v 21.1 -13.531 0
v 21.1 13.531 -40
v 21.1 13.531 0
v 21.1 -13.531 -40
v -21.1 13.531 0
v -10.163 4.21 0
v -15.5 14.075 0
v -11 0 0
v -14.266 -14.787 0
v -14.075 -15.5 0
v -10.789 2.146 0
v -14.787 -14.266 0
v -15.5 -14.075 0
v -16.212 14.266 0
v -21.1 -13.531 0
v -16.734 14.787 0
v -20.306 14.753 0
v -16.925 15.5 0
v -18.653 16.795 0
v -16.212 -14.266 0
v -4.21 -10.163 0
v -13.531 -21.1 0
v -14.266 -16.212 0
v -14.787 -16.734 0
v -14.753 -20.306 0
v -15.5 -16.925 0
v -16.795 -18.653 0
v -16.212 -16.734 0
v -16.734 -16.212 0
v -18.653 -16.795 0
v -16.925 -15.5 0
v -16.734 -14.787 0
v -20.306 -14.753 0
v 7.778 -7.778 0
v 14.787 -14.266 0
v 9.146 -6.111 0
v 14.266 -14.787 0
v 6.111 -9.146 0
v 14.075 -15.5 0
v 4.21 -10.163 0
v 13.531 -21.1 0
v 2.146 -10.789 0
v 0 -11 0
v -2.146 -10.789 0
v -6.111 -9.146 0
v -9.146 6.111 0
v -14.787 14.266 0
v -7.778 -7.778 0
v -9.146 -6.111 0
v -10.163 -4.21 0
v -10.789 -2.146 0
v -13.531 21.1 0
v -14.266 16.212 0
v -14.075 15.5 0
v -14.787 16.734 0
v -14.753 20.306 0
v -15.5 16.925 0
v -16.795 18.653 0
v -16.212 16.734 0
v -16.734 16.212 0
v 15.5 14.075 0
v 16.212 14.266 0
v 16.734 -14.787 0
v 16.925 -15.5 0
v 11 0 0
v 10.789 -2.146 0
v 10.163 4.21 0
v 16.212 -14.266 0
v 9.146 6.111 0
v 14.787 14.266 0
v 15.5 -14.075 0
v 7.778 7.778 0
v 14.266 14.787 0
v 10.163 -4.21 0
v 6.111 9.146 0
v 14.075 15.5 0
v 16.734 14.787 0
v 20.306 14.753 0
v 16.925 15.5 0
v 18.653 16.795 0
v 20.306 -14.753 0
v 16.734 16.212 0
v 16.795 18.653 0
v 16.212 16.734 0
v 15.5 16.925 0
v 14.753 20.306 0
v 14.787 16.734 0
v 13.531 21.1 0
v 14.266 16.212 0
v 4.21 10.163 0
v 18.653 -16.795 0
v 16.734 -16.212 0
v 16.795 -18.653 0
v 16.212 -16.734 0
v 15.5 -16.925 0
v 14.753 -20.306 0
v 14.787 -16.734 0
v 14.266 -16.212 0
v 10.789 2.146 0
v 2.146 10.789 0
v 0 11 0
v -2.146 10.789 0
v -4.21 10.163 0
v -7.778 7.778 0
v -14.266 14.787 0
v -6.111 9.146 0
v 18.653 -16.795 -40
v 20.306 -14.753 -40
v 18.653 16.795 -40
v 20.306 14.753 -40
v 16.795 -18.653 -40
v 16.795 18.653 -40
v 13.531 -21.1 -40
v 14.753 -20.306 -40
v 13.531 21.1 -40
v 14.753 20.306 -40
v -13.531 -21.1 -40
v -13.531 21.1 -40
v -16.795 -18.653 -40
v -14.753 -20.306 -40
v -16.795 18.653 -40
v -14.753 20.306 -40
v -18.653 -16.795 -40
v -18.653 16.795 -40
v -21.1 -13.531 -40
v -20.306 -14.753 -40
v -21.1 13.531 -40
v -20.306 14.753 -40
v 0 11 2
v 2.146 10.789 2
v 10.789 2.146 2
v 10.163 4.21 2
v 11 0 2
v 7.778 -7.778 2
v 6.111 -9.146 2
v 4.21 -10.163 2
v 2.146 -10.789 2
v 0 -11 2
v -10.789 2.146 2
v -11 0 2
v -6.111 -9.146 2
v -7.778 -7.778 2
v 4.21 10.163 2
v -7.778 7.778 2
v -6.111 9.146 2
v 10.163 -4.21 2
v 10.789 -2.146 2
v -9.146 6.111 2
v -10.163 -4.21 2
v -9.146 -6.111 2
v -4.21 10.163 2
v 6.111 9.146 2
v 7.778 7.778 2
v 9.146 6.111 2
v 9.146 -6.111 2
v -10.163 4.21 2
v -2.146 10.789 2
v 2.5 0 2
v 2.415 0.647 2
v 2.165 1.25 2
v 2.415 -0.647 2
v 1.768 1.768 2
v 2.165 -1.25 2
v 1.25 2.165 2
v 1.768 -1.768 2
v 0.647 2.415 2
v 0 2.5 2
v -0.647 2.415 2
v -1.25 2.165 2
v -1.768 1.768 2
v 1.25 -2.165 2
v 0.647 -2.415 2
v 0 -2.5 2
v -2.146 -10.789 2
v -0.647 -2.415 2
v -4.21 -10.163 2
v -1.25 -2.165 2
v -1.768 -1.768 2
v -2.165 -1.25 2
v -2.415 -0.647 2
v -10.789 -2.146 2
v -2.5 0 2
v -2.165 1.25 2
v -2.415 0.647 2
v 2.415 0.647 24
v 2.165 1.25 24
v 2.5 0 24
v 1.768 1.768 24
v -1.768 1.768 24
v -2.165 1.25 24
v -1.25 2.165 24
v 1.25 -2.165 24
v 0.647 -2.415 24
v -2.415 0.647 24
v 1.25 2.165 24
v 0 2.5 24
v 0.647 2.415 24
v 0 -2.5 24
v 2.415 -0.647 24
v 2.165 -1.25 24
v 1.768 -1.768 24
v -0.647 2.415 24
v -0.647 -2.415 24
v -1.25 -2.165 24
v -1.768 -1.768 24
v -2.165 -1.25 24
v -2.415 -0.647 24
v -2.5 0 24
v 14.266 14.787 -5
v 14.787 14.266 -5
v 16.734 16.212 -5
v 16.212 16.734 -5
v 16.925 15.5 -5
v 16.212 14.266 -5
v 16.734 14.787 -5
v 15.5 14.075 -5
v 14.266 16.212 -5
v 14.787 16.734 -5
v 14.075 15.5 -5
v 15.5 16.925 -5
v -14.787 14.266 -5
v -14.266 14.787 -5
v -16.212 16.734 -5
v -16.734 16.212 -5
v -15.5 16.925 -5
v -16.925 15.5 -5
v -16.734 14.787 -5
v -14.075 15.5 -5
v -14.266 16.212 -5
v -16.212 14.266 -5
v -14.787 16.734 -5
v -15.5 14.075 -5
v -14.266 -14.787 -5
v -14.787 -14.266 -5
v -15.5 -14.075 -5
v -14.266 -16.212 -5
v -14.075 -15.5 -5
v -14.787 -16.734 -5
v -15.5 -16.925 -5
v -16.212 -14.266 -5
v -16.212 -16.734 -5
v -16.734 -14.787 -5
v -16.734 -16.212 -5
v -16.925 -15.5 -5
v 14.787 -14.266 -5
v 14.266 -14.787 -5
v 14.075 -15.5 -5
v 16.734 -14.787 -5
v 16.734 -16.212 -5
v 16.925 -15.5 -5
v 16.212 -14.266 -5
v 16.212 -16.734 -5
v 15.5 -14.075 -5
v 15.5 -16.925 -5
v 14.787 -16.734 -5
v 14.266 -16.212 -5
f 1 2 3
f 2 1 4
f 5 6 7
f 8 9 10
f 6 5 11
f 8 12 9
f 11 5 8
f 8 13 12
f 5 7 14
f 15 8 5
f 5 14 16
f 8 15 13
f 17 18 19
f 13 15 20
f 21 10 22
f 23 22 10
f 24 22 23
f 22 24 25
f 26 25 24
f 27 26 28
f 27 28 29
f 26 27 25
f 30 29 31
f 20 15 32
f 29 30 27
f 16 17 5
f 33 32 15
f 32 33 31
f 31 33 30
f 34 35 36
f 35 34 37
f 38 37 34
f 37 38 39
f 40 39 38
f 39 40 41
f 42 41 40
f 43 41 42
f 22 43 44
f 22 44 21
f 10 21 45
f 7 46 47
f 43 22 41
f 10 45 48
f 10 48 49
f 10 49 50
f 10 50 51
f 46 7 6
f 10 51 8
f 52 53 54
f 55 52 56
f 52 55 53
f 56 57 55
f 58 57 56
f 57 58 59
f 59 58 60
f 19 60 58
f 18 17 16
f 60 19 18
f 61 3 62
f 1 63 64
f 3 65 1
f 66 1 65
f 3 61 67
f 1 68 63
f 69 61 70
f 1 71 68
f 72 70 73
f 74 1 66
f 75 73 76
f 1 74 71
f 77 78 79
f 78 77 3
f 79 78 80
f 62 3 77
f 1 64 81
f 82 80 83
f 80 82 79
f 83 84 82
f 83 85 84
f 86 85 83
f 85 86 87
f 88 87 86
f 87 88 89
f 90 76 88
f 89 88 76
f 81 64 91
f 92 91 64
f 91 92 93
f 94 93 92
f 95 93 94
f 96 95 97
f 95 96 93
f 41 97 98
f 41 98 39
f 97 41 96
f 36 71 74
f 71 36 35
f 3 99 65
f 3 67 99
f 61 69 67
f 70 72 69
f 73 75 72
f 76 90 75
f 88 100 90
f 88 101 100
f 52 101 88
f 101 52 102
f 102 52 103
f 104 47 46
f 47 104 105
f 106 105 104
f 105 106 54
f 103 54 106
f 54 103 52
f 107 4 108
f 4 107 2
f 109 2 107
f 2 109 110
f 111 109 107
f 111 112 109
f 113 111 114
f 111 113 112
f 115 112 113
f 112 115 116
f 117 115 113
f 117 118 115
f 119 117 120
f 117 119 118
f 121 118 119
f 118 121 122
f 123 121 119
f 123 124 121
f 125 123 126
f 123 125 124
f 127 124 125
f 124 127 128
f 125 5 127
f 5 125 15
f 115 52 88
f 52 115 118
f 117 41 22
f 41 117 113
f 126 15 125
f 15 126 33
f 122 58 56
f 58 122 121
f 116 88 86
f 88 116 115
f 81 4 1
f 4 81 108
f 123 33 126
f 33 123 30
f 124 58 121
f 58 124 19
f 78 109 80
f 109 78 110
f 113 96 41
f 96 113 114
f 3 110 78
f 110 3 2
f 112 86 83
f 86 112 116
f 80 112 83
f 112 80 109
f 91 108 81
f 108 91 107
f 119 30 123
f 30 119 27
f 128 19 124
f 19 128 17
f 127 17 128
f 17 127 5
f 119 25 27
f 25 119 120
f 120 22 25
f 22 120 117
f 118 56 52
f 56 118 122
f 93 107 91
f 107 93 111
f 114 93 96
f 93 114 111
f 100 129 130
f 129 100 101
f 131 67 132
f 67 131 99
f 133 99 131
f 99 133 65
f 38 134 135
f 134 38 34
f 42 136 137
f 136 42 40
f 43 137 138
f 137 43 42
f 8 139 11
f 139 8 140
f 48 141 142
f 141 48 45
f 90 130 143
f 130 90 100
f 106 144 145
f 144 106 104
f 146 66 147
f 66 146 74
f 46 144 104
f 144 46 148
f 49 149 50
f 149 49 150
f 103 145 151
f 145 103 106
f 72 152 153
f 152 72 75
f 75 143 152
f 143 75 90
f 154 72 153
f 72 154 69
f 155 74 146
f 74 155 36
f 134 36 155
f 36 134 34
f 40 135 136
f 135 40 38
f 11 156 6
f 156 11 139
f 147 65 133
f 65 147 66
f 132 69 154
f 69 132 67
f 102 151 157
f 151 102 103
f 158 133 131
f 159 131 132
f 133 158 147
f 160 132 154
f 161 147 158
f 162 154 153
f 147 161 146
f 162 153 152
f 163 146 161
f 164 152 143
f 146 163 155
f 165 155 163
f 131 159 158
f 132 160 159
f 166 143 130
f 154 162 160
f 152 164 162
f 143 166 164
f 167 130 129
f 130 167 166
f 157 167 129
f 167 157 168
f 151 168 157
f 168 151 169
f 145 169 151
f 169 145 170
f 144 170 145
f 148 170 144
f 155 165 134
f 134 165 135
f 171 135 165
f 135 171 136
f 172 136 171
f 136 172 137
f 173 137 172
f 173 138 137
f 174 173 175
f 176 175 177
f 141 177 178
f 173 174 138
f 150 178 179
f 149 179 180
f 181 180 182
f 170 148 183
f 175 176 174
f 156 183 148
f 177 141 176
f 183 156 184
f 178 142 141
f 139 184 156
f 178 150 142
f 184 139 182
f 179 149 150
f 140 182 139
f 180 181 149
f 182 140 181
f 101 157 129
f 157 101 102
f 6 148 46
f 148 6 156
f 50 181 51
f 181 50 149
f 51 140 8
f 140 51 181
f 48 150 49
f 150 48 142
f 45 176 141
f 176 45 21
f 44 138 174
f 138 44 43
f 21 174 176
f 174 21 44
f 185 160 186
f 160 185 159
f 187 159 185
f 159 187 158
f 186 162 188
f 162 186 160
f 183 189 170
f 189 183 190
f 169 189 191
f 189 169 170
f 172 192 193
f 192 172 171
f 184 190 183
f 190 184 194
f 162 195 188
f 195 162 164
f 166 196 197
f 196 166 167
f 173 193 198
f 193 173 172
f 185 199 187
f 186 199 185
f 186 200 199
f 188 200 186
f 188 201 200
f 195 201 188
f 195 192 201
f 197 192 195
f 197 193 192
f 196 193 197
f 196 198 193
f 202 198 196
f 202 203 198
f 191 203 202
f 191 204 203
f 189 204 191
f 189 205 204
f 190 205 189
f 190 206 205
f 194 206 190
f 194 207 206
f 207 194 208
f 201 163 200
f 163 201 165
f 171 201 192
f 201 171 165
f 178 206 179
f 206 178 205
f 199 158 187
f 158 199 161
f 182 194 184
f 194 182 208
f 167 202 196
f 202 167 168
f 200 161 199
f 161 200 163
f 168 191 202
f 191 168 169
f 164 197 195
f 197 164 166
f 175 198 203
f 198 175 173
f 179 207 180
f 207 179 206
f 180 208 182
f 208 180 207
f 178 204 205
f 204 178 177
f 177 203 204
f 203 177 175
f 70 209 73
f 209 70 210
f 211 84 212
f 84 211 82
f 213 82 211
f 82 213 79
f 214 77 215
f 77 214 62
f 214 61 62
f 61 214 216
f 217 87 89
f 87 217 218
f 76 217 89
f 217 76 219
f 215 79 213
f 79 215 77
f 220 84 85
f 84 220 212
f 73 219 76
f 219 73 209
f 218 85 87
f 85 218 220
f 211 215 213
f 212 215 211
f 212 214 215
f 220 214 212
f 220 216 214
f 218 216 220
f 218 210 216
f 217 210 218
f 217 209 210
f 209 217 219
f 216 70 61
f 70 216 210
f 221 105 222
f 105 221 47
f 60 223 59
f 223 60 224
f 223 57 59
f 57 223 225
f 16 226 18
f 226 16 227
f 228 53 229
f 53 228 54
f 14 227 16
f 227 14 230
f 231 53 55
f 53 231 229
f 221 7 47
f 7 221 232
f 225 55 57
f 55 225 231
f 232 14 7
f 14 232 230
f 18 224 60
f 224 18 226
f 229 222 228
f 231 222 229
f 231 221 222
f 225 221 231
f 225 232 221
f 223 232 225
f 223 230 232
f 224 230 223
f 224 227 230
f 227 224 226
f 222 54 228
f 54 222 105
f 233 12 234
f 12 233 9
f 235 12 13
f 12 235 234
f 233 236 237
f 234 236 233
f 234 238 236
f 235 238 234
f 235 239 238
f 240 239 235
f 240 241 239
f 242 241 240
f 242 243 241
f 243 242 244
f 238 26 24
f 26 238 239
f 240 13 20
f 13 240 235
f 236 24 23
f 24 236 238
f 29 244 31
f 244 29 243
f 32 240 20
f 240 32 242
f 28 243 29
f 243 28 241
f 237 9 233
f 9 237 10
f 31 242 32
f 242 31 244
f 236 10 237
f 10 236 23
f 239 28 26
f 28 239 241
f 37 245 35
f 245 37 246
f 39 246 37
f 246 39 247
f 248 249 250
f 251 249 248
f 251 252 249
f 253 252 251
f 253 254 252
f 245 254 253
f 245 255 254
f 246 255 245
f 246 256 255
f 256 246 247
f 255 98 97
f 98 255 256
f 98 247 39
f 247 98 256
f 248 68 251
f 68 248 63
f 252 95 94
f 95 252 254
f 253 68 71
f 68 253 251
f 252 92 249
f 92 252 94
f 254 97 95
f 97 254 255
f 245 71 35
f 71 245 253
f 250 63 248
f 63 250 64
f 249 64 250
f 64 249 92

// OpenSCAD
m3_major = 2.85;
m3_radius = m3_major/2;

module nema17(motor_length = 40) {
  // NEMA 17 stepper motor.
  difference() {
    union() {
      translate([0, 0, -motor_length/2]) intersection() {
        cube([42.2, 42.2, motor_length], center=true);
        cylinder(r=25.1, h=motor_length+1, center=true, $fn=60);
      }
      cylinder(r=11, h=4, center=true, $fn=32);
      cylinder(r=2.5, h=48, center=true, $fn=24);
    }
    for (a = [0:90:359]) {
      rotate([0, 0, a]) translate([15.5, 15.5, 0])
        cylinder(r=m3_radius, h=10, center=true, $fn=12);
    }
  }
}

nema17();
